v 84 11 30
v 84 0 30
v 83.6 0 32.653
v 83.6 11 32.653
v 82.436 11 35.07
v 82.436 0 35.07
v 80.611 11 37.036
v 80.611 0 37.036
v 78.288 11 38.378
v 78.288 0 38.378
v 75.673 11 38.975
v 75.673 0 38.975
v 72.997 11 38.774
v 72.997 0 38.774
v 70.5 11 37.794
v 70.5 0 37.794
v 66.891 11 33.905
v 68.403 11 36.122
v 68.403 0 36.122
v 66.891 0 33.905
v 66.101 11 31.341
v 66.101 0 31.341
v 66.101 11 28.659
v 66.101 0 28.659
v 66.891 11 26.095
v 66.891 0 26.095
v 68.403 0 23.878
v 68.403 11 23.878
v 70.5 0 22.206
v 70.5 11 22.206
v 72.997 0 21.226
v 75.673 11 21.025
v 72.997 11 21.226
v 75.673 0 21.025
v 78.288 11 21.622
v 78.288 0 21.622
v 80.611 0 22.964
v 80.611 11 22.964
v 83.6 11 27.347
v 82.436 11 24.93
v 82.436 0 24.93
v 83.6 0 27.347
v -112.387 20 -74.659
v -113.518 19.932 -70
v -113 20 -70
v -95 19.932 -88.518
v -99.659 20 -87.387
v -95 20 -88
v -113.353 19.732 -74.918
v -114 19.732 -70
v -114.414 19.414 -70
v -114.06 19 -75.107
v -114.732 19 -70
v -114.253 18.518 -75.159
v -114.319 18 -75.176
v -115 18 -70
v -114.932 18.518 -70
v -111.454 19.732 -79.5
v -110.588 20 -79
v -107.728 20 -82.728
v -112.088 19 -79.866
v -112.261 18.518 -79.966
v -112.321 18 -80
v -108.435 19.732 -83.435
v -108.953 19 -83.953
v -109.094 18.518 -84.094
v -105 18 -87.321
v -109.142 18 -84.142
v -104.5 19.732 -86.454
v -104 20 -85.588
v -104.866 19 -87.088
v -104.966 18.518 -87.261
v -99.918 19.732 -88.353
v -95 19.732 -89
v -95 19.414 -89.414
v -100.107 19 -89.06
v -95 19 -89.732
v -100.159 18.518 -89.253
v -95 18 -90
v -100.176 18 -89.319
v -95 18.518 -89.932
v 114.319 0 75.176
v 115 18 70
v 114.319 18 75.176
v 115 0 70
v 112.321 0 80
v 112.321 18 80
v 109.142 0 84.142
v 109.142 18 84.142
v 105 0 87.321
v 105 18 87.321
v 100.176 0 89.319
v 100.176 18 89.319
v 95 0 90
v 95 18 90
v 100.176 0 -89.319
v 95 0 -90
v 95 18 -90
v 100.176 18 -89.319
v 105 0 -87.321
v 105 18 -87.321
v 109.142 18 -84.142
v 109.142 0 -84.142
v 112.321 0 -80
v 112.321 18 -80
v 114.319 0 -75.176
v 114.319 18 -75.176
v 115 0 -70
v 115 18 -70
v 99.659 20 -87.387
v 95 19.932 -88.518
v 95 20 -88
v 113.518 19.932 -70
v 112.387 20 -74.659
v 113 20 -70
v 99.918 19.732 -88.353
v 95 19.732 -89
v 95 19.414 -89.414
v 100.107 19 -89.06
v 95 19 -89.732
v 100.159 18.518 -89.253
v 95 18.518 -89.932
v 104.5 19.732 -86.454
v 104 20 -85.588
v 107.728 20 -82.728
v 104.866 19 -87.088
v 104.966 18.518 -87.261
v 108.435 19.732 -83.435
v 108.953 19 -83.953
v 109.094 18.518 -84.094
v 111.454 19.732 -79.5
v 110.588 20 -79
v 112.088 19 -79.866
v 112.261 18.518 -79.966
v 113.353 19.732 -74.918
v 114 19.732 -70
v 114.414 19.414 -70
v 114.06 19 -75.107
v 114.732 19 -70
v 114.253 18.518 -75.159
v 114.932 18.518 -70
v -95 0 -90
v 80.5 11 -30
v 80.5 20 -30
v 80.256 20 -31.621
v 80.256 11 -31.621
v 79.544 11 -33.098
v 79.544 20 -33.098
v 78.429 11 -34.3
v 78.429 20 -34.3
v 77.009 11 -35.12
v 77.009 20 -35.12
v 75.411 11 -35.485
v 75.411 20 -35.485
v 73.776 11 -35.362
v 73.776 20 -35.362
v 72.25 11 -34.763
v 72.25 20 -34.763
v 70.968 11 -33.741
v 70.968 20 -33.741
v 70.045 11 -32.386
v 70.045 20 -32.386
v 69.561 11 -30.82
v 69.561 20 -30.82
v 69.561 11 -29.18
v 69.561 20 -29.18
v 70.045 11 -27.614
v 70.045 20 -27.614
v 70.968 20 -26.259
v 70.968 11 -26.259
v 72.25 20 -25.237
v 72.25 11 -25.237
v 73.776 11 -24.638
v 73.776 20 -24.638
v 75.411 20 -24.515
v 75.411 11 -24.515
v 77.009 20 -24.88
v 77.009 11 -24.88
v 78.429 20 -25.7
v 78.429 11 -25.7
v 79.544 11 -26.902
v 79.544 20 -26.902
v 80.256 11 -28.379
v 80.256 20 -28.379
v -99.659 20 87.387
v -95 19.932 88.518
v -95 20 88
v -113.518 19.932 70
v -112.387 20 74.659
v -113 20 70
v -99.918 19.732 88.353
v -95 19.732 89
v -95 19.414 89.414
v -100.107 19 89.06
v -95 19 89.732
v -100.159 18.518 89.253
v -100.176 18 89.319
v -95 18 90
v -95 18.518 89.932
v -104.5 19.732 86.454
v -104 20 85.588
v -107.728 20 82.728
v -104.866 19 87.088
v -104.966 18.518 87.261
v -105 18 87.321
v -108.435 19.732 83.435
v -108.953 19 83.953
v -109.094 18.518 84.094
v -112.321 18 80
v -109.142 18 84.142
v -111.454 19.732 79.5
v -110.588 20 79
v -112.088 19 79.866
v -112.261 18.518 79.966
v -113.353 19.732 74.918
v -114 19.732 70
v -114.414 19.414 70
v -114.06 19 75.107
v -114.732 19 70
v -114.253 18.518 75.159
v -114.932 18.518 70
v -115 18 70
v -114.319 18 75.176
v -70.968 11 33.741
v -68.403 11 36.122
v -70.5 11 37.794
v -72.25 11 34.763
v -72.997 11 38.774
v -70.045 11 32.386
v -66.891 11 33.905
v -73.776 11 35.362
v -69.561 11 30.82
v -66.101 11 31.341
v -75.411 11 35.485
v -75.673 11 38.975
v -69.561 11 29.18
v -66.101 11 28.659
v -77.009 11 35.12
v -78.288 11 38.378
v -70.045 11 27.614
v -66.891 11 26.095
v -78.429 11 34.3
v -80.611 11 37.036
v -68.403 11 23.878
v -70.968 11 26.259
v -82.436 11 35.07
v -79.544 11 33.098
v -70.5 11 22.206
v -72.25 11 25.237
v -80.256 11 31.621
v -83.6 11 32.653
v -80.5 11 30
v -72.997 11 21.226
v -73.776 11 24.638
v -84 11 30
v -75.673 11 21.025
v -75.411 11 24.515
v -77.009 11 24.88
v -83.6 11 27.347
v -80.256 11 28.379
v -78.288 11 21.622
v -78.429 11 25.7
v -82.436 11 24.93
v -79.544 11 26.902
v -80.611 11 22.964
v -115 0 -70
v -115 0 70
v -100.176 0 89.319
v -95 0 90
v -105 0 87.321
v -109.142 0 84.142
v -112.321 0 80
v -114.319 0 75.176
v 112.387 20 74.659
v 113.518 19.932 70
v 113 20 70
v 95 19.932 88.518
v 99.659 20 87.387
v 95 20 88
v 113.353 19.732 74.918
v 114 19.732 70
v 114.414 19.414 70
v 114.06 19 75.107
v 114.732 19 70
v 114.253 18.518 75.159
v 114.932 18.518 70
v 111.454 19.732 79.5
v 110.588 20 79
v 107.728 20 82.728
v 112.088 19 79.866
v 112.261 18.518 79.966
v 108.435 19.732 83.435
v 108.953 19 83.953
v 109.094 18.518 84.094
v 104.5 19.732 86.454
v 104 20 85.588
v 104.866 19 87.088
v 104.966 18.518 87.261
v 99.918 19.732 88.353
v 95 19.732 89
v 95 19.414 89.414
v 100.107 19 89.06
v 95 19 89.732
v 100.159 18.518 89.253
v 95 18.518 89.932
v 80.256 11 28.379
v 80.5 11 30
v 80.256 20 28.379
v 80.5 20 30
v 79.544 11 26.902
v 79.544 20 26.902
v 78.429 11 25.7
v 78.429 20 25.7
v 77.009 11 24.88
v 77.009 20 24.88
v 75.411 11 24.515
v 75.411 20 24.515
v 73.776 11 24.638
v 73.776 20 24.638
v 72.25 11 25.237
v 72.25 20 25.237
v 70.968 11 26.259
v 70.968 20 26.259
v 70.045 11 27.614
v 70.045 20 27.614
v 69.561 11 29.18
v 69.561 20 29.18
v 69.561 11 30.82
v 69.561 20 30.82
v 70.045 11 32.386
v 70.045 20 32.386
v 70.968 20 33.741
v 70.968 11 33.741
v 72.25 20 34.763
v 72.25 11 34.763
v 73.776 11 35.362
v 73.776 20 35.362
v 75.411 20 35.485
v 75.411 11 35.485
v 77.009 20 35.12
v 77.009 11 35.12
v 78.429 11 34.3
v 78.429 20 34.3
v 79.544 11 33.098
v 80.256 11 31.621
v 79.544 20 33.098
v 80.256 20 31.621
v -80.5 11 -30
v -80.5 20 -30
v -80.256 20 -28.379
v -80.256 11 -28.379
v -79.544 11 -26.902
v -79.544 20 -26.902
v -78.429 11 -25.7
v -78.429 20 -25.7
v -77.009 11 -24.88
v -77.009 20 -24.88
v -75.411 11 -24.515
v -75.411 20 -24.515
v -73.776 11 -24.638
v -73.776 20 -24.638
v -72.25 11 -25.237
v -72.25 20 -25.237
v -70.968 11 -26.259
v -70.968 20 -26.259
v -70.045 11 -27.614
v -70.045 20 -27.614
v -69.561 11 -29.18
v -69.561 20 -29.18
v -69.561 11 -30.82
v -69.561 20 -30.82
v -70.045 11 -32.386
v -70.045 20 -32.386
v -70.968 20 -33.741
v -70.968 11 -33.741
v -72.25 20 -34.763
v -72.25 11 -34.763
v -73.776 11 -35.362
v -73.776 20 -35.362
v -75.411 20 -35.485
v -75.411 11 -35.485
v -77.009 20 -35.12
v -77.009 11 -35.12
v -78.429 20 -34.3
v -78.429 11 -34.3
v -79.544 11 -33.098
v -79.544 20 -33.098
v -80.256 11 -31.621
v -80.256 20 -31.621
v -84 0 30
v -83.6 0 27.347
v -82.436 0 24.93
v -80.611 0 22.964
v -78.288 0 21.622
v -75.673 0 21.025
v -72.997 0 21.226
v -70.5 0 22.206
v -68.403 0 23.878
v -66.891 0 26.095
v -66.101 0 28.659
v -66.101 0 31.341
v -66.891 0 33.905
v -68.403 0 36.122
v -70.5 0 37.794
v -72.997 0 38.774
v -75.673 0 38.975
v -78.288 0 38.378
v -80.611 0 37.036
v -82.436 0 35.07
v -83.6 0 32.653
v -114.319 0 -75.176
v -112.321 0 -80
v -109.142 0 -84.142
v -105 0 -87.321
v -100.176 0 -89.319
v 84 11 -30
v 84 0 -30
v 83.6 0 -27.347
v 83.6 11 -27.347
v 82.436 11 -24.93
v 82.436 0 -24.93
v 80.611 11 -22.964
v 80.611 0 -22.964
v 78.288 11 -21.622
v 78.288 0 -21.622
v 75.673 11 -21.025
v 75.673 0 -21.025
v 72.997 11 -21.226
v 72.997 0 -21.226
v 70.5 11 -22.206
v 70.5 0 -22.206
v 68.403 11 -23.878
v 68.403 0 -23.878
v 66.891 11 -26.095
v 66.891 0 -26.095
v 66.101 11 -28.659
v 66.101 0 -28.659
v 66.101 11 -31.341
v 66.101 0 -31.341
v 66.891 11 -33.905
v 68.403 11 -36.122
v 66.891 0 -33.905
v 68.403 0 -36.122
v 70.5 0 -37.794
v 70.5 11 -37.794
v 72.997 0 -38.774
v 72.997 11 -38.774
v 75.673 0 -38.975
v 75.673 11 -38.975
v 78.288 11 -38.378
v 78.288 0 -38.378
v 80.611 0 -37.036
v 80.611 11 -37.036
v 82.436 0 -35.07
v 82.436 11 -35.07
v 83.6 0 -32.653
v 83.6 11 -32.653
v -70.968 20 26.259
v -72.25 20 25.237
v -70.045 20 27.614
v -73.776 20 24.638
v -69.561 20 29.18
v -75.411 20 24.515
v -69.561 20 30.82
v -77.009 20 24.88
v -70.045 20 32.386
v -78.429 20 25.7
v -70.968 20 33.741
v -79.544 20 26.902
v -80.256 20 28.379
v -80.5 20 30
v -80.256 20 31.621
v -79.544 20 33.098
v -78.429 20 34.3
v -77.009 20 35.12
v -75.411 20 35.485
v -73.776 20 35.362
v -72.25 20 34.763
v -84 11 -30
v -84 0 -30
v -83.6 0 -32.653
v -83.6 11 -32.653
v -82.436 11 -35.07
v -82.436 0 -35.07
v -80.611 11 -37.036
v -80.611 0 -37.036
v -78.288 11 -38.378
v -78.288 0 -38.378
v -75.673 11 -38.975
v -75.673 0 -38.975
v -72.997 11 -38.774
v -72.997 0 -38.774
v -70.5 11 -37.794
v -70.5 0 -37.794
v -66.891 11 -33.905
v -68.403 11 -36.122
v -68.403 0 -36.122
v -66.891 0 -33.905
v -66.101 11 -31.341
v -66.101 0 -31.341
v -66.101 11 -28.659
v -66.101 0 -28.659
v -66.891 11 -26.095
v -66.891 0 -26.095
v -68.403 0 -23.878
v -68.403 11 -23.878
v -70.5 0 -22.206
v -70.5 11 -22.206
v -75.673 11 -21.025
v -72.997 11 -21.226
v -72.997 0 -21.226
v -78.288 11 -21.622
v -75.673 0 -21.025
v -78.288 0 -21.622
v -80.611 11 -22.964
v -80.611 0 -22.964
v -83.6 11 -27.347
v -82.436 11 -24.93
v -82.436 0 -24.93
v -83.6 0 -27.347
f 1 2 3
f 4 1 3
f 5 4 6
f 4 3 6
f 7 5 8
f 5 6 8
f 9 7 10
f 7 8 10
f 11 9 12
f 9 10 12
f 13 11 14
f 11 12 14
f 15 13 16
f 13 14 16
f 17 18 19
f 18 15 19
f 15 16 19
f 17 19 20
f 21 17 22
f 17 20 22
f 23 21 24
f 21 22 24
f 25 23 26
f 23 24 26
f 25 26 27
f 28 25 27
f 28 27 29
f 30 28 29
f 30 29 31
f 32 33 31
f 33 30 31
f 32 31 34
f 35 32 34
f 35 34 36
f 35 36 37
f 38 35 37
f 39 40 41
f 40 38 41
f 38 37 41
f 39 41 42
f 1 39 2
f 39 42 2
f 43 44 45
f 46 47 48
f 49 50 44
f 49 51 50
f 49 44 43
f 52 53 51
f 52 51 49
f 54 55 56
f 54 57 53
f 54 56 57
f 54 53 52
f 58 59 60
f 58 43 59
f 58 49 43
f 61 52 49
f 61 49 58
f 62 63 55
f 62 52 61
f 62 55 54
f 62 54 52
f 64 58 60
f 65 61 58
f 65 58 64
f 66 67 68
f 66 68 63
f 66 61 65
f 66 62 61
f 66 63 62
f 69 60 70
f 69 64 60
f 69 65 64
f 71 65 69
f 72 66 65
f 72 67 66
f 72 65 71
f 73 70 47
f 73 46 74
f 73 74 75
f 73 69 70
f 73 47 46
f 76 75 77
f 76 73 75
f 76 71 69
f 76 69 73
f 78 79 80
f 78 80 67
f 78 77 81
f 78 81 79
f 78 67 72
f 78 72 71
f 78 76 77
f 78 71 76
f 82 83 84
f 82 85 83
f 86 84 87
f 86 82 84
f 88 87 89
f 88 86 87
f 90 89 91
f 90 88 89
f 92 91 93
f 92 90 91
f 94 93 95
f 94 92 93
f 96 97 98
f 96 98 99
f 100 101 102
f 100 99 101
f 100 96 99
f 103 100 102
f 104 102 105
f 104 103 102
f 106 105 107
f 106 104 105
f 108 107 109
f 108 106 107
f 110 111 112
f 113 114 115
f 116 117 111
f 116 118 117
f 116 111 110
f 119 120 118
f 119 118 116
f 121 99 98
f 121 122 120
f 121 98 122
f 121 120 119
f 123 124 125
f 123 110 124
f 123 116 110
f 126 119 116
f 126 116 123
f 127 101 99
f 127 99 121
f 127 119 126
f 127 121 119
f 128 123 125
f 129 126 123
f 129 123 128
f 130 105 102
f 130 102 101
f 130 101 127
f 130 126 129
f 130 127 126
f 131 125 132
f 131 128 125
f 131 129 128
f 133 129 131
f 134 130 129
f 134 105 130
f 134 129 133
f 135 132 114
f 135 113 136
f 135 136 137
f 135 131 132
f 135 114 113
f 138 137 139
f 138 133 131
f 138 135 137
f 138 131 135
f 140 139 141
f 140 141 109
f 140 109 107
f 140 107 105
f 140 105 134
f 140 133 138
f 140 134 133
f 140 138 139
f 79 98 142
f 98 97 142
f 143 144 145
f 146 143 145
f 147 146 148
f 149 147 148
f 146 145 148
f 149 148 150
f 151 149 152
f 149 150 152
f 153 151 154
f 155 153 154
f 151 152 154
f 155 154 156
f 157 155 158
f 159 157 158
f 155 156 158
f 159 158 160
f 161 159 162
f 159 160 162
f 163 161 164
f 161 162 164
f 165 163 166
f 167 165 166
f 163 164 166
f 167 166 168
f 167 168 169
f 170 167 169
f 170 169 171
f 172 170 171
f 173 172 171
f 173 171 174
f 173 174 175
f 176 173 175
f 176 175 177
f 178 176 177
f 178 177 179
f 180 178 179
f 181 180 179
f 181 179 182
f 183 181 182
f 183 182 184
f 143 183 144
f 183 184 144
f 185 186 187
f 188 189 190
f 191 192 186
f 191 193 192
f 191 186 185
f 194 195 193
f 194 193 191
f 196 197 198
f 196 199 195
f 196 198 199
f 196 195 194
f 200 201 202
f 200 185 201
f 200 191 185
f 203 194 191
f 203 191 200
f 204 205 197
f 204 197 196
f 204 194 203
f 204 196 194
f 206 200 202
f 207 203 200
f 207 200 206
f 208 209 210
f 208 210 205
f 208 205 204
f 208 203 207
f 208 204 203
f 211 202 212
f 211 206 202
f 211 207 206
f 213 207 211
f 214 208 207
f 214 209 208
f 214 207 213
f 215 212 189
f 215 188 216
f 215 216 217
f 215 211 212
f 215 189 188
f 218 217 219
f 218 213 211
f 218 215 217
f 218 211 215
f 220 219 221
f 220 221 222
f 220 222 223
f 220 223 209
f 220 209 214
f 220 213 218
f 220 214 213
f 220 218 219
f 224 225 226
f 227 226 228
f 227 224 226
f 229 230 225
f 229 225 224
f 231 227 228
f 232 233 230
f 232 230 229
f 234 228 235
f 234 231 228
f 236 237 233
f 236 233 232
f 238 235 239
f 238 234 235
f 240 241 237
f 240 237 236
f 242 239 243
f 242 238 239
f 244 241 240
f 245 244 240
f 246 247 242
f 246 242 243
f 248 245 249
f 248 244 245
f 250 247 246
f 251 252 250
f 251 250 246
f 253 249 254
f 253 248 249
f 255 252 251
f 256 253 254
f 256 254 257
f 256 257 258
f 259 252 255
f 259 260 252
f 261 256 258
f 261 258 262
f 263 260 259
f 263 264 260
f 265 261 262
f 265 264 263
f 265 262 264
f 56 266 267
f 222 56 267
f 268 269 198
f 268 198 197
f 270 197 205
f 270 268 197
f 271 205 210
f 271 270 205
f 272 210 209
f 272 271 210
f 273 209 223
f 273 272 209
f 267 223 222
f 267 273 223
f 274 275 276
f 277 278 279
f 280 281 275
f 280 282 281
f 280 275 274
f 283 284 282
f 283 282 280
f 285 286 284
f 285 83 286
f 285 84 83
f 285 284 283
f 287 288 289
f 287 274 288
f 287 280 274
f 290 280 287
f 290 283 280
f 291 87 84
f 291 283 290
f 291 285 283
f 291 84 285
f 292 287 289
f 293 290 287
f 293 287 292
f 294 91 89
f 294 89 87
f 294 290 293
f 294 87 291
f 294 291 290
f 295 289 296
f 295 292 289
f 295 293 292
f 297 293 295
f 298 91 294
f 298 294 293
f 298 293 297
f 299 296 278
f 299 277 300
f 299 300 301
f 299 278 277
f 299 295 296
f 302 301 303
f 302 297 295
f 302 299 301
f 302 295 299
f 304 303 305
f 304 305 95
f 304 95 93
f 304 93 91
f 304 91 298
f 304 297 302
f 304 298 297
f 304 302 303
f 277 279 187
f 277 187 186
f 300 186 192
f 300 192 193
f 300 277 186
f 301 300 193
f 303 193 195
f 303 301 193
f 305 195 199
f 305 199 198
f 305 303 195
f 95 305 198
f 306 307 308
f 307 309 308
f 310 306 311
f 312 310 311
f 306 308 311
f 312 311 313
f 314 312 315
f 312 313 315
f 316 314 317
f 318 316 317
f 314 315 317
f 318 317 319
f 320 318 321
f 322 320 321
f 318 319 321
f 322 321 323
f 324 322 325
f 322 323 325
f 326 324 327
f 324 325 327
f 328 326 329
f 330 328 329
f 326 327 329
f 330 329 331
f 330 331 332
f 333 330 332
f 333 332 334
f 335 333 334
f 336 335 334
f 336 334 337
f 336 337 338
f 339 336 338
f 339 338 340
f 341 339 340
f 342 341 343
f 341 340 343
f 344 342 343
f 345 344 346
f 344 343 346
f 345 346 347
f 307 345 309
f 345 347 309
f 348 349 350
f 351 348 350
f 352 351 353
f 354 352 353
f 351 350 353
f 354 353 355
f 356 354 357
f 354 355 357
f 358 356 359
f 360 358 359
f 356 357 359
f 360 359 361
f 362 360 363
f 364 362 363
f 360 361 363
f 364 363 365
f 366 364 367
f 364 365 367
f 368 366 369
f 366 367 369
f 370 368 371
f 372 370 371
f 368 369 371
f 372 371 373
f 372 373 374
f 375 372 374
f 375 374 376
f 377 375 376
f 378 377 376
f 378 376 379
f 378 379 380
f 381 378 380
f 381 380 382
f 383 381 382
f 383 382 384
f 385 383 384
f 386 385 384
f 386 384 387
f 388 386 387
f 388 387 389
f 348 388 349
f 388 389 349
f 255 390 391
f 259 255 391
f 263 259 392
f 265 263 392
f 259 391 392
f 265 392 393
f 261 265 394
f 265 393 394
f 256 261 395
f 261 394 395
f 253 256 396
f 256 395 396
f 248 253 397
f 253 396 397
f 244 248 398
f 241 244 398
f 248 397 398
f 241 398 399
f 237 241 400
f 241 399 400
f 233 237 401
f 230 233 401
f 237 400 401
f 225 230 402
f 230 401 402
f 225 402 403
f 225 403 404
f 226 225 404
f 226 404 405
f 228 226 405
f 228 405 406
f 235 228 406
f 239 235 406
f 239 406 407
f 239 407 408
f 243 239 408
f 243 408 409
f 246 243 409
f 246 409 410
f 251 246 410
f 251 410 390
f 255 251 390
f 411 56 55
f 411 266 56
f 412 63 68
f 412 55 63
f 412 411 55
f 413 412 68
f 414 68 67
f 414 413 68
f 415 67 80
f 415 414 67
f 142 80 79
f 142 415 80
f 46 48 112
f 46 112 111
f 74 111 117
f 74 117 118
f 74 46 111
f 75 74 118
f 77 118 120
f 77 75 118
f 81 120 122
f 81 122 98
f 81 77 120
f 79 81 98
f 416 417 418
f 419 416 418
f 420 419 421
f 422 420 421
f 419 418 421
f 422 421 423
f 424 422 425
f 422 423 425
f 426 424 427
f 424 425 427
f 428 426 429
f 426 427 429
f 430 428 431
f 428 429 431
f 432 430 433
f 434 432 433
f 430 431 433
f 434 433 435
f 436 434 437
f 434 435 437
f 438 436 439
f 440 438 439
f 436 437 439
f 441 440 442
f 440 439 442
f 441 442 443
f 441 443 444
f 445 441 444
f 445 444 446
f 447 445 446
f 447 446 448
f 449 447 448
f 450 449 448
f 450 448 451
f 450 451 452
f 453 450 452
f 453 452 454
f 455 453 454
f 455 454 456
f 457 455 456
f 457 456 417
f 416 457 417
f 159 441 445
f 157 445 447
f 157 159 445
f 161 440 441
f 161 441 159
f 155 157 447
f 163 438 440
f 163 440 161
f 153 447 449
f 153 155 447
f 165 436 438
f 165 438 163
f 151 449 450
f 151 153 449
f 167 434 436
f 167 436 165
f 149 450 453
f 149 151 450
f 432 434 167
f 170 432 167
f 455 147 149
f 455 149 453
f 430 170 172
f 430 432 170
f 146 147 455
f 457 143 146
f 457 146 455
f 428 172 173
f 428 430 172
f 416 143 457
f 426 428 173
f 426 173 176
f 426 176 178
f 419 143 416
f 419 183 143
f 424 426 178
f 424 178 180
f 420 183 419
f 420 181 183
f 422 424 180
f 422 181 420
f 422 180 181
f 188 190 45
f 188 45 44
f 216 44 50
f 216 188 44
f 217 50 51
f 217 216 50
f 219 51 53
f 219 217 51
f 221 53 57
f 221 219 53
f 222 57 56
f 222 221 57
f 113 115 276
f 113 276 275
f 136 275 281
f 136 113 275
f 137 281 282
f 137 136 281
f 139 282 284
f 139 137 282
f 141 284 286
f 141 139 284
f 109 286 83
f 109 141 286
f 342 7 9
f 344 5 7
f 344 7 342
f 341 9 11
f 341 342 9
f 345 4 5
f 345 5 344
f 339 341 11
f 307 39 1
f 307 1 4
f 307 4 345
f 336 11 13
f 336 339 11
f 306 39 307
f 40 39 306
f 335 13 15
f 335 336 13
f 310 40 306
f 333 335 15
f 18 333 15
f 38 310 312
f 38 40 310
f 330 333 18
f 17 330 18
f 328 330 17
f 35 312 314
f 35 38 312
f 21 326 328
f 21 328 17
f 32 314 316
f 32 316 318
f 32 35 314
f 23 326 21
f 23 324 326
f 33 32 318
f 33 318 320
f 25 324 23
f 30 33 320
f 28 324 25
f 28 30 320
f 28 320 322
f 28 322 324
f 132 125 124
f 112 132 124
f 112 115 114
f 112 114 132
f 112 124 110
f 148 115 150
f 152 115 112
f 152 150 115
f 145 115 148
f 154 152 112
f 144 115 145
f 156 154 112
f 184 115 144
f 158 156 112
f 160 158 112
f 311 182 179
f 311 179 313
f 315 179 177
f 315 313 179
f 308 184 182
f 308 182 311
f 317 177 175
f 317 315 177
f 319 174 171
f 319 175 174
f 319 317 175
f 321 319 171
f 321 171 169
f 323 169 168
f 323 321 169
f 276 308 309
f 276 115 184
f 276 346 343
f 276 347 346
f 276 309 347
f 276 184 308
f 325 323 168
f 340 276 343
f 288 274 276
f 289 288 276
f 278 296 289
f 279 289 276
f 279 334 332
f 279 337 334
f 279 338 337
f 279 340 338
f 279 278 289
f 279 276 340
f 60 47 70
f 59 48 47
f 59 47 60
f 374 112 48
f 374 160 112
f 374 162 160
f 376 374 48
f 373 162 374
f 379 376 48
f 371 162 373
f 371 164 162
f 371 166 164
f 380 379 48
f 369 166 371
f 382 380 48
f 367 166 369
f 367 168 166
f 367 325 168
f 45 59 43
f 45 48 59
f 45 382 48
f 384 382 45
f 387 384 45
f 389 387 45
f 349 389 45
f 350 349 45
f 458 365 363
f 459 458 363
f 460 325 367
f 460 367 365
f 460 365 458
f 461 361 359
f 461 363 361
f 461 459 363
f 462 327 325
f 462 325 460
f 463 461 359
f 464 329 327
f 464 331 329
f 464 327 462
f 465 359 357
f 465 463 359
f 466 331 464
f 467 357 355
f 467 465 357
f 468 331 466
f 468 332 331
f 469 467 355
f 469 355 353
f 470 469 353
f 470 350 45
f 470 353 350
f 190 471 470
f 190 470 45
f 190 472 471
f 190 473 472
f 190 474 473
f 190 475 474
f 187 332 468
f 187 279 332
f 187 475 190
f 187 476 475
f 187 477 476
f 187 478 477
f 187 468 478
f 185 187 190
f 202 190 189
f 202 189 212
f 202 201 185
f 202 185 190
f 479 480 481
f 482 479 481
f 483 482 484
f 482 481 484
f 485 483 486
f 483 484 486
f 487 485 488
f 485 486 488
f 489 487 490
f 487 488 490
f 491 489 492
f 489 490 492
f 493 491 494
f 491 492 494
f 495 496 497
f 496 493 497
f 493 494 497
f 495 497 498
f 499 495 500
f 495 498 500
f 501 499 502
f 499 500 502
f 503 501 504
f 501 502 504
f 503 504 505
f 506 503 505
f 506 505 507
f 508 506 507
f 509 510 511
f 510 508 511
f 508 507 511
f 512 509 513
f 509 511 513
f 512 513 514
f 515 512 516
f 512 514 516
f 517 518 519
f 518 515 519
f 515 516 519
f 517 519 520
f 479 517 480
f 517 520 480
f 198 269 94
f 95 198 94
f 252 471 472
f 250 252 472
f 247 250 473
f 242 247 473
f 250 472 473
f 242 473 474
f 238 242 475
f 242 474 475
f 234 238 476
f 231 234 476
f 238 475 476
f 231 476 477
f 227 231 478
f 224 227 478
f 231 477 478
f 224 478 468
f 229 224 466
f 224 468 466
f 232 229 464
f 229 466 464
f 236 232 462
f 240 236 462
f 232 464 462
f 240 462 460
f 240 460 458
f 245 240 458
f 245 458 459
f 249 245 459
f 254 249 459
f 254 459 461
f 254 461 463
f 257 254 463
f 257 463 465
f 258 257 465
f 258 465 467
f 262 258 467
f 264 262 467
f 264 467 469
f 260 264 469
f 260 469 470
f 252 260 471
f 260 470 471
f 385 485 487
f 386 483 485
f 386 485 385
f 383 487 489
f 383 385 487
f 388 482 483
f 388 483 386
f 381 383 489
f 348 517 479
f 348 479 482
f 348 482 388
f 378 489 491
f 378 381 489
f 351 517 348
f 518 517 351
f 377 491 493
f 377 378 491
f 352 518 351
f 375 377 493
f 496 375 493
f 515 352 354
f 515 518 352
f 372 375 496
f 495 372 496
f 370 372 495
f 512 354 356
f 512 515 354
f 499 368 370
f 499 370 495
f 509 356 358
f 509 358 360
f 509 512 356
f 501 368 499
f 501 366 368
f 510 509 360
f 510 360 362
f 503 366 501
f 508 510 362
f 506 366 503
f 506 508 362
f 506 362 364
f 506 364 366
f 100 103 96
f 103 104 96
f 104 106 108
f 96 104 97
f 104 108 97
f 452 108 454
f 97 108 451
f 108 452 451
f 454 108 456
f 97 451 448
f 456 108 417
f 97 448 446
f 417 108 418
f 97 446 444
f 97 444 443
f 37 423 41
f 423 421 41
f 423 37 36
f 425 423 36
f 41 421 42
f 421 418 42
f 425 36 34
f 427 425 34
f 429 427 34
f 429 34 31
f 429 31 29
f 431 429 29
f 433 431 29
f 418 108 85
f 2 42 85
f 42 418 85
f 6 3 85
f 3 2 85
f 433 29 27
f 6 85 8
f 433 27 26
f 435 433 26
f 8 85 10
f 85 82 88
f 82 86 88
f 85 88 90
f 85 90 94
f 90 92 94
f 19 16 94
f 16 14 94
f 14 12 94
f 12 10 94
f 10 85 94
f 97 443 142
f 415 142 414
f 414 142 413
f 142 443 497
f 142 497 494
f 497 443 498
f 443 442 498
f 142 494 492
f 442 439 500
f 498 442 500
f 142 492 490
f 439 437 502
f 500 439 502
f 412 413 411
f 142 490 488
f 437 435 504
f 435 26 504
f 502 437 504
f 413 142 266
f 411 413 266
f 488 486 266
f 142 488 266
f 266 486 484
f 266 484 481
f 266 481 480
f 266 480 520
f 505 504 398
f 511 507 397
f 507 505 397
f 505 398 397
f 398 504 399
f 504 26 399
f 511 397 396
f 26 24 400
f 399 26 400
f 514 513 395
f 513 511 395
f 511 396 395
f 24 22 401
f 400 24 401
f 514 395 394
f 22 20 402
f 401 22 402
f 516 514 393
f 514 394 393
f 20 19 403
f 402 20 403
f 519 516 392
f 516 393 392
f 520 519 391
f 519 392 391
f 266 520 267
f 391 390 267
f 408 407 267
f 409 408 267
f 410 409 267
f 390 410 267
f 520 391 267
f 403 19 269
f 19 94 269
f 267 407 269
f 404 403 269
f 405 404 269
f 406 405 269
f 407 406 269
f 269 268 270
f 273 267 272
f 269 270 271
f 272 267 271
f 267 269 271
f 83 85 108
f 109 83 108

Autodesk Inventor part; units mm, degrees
ref_plane "YZ Plane" through (0, 0, 0) normal (1, 0, 0) x (0, 1, 0)
ref_plane "XZ Plane" through (0, 0, 0) normal (0, 1, 0) x (-1, 0, 0)
ref_plane "XY Plane" through (0, 0, 0) normal (0, 0, 1) x (1, 0, 0)
sketch "Sketch1" plane through (0, 0, 0) normal (0, 1, 0) x (-1, 0, 0)
  line L0 (115, 90) -> (-115, 90)
  line L1 (-115, 90) -> (-115, -90)
  line L2 (-115, -90) -> (115, -90)
  line L3 (115, -90) -> (115, 90)
  line L4 (115, 90) -> (-115, -90) construction
  line L5 (-115, 90) -> (115, -90) construction
  point P0 (0, 0)
  dimension "d0" = 230
  dimension "d1" = 180
extrude "Extrusion1" add sketch "Sketch1" along normal blind 20
fillet "Fillet1" radius 2 4 edges at (0, 20, 90) (115, 20, 0) (0, 20, -90) (-115, 20, 0)
fillet "Fillet2" radius 20 8 edges at (-114.4142, 19.4142, 89.4142) (-115, 9, 90) (114.4142, 19.4142, 89.4142) (115, 9, 90) (-115, 9, -90) (-114.4142, 19.4142, -89.4142) (114.4142, 19.4142, -89.4142) (115, 9, -90)
sketch "Sketch2" plane through (0, 20, 0) normal (0, 1, 0) x (1, 0, 0)
  line L0 (75, 30) -> (0, 0)
  circle A0 centre (75, 30) radius 5.5
  dimension "d6" = 11
extrude "Extrusion2" cut sketch "Sketch2" against normal blind 20
sketch "Sketch3" plane through (0, 0, 0) normal (0, -1, 0) x (1, 0, 0)
  circle A0 centre (75, -30) radius 5.5 projected
  circle A1 centre (75, -30) radius 9
  point P0 (0, 0)
  dimension "d9" = 18
extrude "Extrusion3" cut sketch "Sketch3" against normal blind 11 contours A0 | A1
mirror "Mirror1" about plane through (0, 0, 0) normal (0, 0, 1) of "Extrusion2", "Extrusion3"
mirror "Mirror2" about plane through (0, 0, 0) normal (1, 0, 0) of "Extrusion2", "Extrusion3", "Mirror1"
properties part number "stand" material "Wood (Birch)"
